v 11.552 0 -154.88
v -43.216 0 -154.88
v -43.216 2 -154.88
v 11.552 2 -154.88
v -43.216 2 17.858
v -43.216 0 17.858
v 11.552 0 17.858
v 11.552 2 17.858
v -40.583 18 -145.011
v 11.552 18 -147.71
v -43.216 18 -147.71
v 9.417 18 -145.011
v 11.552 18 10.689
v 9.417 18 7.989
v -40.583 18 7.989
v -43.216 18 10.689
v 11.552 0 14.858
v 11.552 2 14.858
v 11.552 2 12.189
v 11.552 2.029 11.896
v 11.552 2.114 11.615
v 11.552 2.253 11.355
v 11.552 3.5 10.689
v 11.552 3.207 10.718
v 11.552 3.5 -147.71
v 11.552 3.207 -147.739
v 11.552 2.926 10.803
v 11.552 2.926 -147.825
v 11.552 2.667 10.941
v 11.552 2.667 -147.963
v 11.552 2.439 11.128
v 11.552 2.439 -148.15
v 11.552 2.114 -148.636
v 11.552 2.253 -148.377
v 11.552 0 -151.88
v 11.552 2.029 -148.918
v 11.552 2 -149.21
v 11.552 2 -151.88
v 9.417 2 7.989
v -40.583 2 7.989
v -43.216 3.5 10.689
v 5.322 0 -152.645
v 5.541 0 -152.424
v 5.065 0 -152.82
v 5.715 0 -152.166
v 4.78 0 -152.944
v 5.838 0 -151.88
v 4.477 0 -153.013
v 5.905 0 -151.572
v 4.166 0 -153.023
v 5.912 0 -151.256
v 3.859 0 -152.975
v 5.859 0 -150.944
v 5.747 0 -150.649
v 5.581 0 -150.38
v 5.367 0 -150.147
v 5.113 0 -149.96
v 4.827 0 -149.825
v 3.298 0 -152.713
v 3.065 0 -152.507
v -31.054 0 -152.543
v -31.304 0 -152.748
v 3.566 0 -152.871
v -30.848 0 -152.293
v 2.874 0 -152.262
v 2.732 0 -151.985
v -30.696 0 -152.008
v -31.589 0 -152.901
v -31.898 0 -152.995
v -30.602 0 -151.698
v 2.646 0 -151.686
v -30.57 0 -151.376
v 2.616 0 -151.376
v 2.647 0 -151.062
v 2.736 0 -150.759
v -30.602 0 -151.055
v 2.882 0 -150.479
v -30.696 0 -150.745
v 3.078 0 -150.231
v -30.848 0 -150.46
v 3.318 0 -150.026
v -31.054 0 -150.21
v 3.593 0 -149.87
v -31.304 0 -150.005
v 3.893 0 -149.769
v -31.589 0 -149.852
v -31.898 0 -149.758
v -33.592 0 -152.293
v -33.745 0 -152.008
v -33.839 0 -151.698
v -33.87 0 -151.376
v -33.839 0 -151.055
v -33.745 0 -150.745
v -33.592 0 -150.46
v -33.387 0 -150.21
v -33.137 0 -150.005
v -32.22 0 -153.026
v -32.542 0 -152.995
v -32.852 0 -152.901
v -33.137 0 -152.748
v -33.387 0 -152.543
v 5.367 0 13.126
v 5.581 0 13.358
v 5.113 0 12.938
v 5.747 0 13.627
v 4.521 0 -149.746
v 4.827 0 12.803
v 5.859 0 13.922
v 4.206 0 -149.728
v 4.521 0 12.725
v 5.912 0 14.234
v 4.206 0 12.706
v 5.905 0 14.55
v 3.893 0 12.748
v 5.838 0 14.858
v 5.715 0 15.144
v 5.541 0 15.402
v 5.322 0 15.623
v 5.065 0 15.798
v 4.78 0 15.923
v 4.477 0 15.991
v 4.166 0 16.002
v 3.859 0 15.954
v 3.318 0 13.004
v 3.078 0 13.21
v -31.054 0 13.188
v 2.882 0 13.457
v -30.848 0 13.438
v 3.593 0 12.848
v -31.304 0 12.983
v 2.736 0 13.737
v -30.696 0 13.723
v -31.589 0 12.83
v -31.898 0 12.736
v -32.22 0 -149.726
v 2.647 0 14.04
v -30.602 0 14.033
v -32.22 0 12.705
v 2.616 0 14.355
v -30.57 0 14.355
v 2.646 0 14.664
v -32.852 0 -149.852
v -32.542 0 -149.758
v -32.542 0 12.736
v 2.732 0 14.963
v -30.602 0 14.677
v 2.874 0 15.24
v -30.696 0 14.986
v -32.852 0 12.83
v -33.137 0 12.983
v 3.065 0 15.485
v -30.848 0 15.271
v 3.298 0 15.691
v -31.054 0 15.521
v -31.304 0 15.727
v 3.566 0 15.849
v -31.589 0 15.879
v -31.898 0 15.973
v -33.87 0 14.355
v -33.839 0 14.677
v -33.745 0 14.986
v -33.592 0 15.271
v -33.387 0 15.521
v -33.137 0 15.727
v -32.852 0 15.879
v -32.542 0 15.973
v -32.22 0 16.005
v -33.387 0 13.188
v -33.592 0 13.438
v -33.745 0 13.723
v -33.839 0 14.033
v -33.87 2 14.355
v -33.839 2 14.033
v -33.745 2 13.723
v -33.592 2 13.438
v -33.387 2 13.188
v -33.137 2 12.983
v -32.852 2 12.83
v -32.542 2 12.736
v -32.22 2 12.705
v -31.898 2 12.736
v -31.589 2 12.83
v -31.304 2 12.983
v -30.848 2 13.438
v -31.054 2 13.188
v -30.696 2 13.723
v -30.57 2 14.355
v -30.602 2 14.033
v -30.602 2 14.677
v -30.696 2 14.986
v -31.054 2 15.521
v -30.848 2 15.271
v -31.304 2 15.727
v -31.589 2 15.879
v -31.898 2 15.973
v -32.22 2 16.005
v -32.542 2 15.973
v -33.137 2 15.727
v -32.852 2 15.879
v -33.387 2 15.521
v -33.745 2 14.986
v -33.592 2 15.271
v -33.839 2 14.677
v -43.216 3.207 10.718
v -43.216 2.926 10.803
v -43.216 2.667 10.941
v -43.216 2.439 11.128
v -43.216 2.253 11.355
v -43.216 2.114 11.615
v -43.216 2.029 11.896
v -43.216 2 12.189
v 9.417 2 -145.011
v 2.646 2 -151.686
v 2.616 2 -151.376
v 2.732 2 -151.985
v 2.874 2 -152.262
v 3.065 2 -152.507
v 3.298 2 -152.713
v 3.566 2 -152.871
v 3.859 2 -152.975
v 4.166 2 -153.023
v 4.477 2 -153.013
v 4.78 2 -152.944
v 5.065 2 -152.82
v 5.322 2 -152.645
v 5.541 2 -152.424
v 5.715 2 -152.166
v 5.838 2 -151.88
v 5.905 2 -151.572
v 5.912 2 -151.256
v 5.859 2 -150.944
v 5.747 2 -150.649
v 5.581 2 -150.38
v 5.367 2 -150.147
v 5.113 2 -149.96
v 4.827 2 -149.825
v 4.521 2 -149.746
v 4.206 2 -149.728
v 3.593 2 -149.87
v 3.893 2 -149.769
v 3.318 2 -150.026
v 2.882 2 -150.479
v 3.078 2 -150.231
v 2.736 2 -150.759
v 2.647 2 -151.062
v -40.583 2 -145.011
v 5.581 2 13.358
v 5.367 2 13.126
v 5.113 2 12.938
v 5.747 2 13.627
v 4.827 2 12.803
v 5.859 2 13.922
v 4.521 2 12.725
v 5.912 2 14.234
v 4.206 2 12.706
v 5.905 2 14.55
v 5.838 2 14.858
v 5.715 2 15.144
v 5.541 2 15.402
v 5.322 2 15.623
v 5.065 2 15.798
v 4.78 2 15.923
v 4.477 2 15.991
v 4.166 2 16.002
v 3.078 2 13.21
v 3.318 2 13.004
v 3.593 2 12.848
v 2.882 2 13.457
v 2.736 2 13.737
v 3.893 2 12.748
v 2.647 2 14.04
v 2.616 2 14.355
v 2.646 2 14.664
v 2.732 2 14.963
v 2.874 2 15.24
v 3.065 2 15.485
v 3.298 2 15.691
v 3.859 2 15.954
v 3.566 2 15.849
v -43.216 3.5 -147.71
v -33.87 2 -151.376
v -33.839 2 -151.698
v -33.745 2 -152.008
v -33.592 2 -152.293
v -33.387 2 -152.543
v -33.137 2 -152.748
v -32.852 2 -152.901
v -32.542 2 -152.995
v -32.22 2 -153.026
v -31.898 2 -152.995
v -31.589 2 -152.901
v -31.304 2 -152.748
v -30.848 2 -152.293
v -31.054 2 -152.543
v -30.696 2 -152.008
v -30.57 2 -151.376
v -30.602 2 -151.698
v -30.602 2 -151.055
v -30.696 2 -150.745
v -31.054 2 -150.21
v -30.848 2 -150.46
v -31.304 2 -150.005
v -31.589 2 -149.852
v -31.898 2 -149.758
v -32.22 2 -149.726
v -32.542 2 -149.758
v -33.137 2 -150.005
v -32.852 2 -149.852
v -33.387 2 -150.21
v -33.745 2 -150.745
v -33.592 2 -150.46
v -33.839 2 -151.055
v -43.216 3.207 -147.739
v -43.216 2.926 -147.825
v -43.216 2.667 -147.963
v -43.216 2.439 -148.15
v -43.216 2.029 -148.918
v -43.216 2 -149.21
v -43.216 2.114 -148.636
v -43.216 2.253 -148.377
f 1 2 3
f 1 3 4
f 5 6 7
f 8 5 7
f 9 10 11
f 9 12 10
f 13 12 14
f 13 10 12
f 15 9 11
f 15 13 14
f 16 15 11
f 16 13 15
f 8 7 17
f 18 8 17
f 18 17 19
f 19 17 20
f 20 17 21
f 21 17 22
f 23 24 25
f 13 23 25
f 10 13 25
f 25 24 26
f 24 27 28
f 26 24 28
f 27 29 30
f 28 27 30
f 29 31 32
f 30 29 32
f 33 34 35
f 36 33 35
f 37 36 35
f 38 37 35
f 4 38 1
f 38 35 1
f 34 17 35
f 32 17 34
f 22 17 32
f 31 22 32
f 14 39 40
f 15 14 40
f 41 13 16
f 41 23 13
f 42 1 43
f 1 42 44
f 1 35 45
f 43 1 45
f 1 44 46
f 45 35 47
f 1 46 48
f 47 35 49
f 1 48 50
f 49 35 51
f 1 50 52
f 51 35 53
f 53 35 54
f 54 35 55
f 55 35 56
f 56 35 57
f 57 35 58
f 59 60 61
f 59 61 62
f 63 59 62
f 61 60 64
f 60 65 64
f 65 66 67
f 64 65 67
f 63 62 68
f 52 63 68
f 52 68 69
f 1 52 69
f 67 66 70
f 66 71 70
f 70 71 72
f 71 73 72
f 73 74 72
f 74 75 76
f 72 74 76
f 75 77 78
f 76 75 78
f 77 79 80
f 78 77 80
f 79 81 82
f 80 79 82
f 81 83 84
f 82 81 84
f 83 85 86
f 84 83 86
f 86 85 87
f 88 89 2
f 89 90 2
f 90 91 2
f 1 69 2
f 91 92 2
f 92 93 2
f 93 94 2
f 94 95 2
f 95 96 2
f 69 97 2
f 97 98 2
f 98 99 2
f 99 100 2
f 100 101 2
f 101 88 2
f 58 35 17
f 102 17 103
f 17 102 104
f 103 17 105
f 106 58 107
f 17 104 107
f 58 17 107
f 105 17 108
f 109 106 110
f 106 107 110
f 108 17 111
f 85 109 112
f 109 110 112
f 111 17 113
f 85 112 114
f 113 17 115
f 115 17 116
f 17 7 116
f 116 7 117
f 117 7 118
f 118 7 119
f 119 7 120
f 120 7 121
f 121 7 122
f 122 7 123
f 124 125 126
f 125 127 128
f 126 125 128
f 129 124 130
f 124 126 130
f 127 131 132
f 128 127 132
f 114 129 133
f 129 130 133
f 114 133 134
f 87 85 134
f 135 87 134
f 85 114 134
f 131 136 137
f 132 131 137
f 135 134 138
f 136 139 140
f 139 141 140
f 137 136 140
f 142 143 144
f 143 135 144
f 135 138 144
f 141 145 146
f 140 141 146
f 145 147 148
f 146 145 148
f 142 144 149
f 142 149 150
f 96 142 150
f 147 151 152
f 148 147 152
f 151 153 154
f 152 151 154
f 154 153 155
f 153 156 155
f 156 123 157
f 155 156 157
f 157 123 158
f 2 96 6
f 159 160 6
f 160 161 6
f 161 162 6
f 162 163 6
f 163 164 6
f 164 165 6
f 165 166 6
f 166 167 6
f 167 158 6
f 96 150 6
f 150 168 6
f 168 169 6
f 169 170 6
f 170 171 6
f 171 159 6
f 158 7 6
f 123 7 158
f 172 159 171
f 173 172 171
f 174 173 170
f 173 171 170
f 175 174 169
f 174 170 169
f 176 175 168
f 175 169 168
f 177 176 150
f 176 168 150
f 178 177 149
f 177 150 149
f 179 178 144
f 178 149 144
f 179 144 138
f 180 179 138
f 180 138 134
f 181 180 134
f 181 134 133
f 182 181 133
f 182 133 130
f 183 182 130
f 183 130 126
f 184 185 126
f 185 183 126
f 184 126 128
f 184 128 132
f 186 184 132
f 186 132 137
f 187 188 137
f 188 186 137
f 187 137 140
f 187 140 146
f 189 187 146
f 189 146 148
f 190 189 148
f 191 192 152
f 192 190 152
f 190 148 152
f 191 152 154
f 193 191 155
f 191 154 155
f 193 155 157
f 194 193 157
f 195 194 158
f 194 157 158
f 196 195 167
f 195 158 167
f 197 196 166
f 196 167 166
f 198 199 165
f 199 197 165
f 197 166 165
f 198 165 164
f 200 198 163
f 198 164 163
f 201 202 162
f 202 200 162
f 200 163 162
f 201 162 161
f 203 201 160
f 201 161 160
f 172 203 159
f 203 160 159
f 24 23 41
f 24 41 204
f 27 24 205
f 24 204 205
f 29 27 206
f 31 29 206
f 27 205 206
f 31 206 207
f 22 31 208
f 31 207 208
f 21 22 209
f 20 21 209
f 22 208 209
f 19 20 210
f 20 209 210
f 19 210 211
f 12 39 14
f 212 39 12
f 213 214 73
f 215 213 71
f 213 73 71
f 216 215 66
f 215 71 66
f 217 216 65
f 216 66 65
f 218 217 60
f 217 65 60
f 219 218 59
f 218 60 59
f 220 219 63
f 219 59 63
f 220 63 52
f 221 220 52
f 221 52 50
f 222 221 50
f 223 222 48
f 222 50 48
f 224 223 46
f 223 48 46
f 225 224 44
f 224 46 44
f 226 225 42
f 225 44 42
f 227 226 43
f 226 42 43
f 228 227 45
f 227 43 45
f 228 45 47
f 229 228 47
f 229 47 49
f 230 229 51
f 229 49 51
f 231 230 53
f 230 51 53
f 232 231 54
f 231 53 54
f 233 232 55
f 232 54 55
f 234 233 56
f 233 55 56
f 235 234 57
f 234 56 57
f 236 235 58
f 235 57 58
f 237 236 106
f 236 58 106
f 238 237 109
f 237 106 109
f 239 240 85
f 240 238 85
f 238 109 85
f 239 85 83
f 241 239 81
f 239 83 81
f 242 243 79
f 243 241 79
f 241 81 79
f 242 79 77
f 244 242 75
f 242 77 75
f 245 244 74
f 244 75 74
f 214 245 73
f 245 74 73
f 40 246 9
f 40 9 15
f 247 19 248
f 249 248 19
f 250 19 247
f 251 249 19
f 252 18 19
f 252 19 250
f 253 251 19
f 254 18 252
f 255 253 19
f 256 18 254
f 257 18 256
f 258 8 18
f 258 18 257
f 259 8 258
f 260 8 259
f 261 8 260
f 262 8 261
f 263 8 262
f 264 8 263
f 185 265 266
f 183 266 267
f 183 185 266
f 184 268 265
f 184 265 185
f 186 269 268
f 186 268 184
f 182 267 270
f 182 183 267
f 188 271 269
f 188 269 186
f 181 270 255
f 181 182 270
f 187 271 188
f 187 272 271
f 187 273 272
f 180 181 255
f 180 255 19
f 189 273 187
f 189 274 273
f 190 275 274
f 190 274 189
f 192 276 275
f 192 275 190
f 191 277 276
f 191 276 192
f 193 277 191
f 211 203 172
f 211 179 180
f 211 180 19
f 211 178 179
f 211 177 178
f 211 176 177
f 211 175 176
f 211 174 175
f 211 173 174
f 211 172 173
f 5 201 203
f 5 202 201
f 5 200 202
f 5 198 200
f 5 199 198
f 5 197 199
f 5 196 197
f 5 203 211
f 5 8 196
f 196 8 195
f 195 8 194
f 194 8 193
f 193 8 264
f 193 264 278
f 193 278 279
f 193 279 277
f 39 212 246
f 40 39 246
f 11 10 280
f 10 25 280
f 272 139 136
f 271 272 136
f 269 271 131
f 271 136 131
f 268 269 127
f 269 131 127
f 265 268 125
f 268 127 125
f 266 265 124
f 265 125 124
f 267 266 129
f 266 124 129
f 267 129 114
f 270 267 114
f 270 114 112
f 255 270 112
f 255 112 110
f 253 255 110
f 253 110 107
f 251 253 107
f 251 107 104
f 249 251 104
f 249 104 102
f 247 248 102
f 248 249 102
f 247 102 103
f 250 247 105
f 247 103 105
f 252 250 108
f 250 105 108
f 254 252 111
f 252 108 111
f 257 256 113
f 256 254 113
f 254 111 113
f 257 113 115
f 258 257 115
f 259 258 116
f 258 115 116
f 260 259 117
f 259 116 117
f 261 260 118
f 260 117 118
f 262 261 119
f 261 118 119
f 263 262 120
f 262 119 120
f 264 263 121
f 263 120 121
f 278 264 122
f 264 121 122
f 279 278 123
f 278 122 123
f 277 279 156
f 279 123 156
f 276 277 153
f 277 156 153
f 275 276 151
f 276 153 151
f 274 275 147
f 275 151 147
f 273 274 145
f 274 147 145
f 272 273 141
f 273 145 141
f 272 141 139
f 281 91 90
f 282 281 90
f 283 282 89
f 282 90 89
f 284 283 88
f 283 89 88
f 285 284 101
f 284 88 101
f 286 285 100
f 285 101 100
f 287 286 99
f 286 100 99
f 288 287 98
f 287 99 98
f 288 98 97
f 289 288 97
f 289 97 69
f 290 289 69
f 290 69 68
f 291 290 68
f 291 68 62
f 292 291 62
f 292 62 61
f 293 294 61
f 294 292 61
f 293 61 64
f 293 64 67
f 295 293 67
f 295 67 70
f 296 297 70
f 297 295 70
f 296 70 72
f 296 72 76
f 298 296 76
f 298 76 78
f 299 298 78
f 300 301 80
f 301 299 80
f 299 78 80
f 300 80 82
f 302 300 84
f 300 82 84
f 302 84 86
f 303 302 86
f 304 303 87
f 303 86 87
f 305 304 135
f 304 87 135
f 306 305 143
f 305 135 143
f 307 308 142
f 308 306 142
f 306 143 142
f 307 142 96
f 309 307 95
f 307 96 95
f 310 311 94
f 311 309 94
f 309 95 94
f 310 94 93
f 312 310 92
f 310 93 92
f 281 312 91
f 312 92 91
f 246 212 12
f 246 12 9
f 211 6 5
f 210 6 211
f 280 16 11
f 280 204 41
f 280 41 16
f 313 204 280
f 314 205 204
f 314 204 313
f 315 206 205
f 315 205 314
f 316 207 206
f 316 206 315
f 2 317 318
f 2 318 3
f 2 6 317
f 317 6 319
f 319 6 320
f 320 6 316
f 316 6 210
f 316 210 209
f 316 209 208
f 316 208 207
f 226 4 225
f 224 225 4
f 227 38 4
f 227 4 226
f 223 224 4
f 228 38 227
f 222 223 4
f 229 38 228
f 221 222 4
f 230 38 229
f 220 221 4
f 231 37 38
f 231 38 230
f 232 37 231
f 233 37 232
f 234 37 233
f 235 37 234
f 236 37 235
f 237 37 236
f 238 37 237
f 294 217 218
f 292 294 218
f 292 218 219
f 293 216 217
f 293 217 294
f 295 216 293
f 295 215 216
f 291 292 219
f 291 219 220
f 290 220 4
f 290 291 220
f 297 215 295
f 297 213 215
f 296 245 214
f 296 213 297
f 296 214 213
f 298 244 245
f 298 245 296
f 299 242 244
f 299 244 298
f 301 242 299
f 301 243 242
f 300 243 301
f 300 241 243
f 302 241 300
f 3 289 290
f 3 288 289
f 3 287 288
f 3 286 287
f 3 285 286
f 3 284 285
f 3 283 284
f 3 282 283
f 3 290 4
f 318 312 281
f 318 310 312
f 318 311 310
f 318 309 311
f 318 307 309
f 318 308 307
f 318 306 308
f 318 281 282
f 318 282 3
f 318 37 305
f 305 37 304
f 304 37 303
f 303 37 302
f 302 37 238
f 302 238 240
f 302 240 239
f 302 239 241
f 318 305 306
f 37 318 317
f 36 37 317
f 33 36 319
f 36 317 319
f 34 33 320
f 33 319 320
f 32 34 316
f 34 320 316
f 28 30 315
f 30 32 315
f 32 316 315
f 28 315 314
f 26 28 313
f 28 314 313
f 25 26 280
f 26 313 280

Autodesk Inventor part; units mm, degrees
ref_plane "YZ Plane" through (0, 0, 0) normal (1, 0, 0) x (0, 1, 0)
ref_plane "XZ Plane" through (0, 0, 0) normal (0, 1, 0) x (-1, 0, 0)
ref_plane "XY Plane" through (0, 0, 0) normal (0, 0, 1) x (1, 0, 0)
sketch "Sketch1" plane through (0, 0, 0) normal (0, 1, 0) x (-1, 0, 0)
  line L0 (40.5829, -68.5109) -> (-9.4171, -68.5109)
  line L1 (-9.4171, -68.5109) -> (-9.4171, 7.9891)
  line L2 (-9.4171, 7.9891) -> (40.5829, 7.9891)
  line L3 (40.5829, 7.9891) -> (40.5829, -68.5109)
  line L4 (40.5829, -68.5109) -> (-9.4171, -68.5109)
  line L5 (-9.4171, -68.5109) -> (-9.4171, -145.0109)
  line L6 (-9.4171, -145.0109) -> (40.5829, -145.0109)
  line L7 (40.5829, -145.0109) -> (40.5829, -68.5109)
  line L8 (43.2164, 17.8584) -> (43.2164, -154.8803)
  line L9 (43.2164, -68.5109) -> (-11.5522, -68.5109)
  line L10 (-11.5522, -68.5109) -> (-11.5522, -147.7105)
  line L11 (-11.5522, -147.7105) -> (43.2164, -147.7105)
  line L12 (43.2164, -147.7105) -> (43.2164, -68.5109)
  line L13 (-11.5522, 10.6887) -> (43.2164, 10.6887)
  line L14 (-11.5522, -68.5109) -> (-11.5522, 10.6887)
  circle A0 centre (-4.2663, -151.3765) radius 1.65
  circle A1 centre (32.2203, -151.3765) radius 1.65
  line L15 (43.2164, -147.7105) -> (43.2164, -154.8803)
  line L16 (43.2164, -154.8803) -> (-11.5522, -154.8803)
  line L17 (-13.2912, -151.8803) -> (16.3367, -151.8803)
  line L18 (-11.5522, -154.8803) -> (-11.5522, -147.7105)
  line L19 (-11.5522, 10.6887) -> (43.2164, 10.6887)
  line L20 (-13.2912, 14.8584) -> (16.3367, 14.8584)
  circle A2 centre (-4.2663, 14.3547) radius 1.65
  line L21 (-11.5522, 17.8584) -> (-11.5522, 10.6887)
  line L22 (43.2164, 17.8584) -> (-11.5522, 17.8584)
  circle A3 centre (32.2203, 14.3547) radius 1.65
  line L23 (43.2164, 10.6887) -> (43.2164, 17.8584)
  point P0 (0, 0)
  point P1 (7.1317, -61.1506)
  point P2 (-9.4171, -68.5109)
  dimension "d2" = 50
  dimension "d3" = 76.5
  dimension "d4" = 76.5
  dimension "d5" = 3.3
  dimension "d6" = 3.3
extrude "Extrusion1" add sketch "Sketch1" along normal blind 18 contours L9 L8 L11 L10 L5 L6 L7 | L3 L2 L1 L9 L14 L13 L8
extrude "Extrusion2" add sketch "Sketch1" along normal blind 2 contours L7 L6 L5 L0 | L0 L1 L2 L3 | L13 L21 L22 L8 | L8 L16 L18 L11
fillet "Fillet1" radius 1.5 1 edges at (-15.8321, 2, -147.7105)
fillet "Fillet2" radius 1.5 1 edges at (-15.8321, 2, 10.6887)
properties part number "beban"
